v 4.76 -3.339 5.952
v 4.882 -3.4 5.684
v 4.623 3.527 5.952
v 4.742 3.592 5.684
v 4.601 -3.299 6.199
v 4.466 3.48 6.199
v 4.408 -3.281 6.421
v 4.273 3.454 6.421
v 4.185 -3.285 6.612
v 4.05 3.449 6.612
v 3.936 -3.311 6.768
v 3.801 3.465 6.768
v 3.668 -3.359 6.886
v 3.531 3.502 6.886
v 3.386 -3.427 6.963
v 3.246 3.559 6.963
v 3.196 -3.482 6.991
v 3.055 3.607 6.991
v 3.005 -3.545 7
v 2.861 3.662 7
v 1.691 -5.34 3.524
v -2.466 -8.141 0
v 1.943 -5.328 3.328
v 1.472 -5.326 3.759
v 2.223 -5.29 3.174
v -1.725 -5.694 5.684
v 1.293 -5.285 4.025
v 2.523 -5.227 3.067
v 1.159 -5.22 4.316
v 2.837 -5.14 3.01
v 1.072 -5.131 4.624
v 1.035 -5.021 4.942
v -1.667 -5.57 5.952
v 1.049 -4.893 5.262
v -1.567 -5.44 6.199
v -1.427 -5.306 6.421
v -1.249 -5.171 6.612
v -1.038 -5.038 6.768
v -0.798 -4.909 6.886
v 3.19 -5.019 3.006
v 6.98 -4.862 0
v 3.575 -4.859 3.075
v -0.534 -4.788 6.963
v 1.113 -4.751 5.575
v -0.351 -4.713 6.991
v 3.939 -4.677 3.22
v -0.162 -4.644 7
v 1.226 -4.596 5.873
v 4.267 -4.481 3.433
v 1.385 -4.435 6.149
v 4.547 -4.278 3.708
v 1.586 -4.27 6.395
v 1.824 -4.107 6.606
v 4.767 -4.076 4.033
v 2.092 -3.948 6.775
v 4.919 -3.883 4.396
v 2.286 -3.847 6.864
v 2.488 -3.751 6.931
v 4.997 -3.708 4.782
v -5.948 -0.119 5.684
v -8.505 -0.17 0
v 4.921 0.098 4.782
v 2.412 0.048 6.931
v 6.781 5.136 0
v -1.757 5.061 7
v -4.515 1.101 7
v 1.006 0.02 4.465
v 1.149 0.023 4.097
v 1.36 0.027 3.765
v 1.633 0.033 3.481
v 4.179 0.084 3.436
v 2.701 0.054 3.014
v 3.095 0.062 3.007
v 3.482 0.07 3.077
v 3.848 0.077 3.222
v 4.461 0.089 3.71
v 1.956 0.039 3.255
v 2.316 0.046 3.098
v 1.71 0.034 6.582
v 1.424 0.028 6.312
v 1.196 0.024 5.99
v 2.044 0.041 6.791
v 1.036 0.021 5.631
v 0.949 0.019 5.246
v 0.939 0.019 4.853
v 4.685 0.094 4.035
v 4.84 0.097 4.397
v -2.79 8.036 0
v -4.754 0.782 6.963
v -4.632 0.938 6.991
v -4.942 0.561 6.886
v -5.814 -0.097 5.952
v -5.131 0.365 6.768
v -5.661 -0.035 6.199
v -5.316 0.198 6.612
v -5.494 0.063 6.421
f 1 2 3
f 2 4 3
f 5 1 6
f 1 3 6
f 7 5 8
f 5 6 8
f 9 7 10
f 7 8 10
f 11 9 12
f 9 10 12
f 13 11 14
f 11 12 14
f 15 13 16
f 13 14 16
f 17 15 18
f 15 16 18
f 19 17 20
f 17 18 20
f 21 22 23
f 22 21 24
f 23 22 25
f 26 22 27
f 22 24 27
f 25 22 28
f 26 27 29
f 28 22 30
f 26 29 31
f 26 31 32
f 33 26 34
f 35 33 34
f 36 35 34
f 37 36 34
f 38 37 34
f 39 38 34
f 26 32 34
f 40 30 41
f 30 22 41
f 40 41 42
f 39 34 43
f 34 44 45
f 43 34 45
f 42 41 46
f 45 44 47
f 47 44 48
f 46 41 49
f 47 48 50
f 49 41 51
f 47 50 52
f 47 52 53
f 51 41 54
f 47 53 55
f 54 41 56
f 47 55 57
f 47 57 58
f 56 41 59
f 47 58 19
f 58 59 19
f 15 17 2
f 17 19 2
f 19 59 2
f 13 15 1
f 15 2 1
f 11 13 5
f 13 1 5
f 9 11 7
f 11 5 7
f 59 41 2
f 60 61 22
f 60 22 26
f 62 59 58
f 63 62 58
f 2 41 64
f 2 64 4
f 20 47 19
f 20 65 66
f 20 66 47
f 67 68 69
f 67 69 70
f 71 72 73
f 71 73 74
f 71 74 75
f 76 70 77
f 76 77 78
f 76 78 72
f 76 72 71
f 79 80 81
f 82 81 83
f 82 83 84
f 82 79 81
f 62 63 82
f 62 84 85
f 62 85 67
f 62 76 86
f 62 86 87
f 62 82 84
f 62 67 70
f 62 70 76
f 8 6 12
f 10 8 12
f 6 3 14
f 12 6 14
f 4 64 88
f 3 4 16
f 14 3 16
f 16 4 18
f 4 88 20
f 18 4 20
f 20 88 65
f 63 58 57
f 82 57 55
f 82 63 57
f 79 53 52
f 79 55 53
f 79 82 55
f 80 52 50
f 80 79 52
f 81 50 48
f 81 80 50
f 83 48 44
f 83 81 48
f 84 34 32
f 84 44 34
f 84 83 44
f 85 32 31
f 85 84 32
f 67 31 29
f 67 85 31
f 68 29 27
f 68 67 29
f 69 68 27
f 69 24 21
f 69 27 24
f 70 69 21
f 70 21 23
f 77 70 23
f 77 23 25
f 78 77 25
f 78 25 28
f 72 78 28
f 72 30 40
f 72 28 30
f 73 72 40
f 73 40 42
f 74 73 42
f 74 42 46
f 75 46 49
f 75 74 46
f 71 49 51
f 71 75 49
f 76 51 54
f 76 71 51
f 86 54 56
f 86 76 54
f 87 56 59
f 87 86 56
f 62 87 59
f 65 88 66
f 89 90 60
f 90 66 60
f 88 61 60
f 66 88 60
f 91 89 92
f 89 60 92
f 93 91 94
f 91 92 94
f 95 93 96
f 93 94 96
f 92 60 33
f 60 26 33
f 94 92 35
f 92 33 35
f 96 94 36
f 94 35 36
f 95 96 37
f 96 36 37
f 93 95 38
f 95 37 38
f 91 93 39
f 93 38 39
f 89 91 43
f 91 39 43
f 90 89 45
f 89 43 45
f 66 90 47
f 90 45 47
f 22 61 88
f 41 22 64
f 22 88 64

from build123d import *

# Parameters (mm, degrees)
F1_DEPTH = 7
F1_TAPER = 20
F2_R     = 2
F6_DEPTH = 5.3744027906


with BuildPart() as f1:
    # F0 (on Top) → F1 (new body)
    with BuildSketch(Plane.XY):
        Polygon((-2.466497474, -8.1410730242), (6.9804309133, -4.861508412), (6.7806410345, 5.136495589), (-2.7897642884, 8.0360372691), (-8.5048101854, -0.1699514219), align=None)
    extrude(amount=F1_DEPTH, taper=F1_TAPER)

    # F2
    f2_edges = [f1.edges().sort_by_distance(p)[0] for p in [
        (4.333253, 0.086591, 7),
        (-3.454778, -2.617076, 7),
    ]]
    fillet(f2_edges, radius=F2_R)

    # F5 (on face) → F6 (cut, through all)
    with BuildSketch(Plane(origin=(0, 0, 0), x_dir=(0.9998004001, 0.0199789879, 0), z_dir=(0.0199789879, -0.9998004001, 0))):
        with BuildLine():
            Line((4.9218312378, 4.7824094277), (2.4123963387, 6.9308649574))
            ThreePointArc((2.4123963387, 6.9308649574), (1.6329889121, 3.4807425637), (4.9218312378, 4.7824094277))
        make_face()
    extrude(amount=F6_DEPTH, mode=Mode.SUBTRACT)


solid = f1.part
